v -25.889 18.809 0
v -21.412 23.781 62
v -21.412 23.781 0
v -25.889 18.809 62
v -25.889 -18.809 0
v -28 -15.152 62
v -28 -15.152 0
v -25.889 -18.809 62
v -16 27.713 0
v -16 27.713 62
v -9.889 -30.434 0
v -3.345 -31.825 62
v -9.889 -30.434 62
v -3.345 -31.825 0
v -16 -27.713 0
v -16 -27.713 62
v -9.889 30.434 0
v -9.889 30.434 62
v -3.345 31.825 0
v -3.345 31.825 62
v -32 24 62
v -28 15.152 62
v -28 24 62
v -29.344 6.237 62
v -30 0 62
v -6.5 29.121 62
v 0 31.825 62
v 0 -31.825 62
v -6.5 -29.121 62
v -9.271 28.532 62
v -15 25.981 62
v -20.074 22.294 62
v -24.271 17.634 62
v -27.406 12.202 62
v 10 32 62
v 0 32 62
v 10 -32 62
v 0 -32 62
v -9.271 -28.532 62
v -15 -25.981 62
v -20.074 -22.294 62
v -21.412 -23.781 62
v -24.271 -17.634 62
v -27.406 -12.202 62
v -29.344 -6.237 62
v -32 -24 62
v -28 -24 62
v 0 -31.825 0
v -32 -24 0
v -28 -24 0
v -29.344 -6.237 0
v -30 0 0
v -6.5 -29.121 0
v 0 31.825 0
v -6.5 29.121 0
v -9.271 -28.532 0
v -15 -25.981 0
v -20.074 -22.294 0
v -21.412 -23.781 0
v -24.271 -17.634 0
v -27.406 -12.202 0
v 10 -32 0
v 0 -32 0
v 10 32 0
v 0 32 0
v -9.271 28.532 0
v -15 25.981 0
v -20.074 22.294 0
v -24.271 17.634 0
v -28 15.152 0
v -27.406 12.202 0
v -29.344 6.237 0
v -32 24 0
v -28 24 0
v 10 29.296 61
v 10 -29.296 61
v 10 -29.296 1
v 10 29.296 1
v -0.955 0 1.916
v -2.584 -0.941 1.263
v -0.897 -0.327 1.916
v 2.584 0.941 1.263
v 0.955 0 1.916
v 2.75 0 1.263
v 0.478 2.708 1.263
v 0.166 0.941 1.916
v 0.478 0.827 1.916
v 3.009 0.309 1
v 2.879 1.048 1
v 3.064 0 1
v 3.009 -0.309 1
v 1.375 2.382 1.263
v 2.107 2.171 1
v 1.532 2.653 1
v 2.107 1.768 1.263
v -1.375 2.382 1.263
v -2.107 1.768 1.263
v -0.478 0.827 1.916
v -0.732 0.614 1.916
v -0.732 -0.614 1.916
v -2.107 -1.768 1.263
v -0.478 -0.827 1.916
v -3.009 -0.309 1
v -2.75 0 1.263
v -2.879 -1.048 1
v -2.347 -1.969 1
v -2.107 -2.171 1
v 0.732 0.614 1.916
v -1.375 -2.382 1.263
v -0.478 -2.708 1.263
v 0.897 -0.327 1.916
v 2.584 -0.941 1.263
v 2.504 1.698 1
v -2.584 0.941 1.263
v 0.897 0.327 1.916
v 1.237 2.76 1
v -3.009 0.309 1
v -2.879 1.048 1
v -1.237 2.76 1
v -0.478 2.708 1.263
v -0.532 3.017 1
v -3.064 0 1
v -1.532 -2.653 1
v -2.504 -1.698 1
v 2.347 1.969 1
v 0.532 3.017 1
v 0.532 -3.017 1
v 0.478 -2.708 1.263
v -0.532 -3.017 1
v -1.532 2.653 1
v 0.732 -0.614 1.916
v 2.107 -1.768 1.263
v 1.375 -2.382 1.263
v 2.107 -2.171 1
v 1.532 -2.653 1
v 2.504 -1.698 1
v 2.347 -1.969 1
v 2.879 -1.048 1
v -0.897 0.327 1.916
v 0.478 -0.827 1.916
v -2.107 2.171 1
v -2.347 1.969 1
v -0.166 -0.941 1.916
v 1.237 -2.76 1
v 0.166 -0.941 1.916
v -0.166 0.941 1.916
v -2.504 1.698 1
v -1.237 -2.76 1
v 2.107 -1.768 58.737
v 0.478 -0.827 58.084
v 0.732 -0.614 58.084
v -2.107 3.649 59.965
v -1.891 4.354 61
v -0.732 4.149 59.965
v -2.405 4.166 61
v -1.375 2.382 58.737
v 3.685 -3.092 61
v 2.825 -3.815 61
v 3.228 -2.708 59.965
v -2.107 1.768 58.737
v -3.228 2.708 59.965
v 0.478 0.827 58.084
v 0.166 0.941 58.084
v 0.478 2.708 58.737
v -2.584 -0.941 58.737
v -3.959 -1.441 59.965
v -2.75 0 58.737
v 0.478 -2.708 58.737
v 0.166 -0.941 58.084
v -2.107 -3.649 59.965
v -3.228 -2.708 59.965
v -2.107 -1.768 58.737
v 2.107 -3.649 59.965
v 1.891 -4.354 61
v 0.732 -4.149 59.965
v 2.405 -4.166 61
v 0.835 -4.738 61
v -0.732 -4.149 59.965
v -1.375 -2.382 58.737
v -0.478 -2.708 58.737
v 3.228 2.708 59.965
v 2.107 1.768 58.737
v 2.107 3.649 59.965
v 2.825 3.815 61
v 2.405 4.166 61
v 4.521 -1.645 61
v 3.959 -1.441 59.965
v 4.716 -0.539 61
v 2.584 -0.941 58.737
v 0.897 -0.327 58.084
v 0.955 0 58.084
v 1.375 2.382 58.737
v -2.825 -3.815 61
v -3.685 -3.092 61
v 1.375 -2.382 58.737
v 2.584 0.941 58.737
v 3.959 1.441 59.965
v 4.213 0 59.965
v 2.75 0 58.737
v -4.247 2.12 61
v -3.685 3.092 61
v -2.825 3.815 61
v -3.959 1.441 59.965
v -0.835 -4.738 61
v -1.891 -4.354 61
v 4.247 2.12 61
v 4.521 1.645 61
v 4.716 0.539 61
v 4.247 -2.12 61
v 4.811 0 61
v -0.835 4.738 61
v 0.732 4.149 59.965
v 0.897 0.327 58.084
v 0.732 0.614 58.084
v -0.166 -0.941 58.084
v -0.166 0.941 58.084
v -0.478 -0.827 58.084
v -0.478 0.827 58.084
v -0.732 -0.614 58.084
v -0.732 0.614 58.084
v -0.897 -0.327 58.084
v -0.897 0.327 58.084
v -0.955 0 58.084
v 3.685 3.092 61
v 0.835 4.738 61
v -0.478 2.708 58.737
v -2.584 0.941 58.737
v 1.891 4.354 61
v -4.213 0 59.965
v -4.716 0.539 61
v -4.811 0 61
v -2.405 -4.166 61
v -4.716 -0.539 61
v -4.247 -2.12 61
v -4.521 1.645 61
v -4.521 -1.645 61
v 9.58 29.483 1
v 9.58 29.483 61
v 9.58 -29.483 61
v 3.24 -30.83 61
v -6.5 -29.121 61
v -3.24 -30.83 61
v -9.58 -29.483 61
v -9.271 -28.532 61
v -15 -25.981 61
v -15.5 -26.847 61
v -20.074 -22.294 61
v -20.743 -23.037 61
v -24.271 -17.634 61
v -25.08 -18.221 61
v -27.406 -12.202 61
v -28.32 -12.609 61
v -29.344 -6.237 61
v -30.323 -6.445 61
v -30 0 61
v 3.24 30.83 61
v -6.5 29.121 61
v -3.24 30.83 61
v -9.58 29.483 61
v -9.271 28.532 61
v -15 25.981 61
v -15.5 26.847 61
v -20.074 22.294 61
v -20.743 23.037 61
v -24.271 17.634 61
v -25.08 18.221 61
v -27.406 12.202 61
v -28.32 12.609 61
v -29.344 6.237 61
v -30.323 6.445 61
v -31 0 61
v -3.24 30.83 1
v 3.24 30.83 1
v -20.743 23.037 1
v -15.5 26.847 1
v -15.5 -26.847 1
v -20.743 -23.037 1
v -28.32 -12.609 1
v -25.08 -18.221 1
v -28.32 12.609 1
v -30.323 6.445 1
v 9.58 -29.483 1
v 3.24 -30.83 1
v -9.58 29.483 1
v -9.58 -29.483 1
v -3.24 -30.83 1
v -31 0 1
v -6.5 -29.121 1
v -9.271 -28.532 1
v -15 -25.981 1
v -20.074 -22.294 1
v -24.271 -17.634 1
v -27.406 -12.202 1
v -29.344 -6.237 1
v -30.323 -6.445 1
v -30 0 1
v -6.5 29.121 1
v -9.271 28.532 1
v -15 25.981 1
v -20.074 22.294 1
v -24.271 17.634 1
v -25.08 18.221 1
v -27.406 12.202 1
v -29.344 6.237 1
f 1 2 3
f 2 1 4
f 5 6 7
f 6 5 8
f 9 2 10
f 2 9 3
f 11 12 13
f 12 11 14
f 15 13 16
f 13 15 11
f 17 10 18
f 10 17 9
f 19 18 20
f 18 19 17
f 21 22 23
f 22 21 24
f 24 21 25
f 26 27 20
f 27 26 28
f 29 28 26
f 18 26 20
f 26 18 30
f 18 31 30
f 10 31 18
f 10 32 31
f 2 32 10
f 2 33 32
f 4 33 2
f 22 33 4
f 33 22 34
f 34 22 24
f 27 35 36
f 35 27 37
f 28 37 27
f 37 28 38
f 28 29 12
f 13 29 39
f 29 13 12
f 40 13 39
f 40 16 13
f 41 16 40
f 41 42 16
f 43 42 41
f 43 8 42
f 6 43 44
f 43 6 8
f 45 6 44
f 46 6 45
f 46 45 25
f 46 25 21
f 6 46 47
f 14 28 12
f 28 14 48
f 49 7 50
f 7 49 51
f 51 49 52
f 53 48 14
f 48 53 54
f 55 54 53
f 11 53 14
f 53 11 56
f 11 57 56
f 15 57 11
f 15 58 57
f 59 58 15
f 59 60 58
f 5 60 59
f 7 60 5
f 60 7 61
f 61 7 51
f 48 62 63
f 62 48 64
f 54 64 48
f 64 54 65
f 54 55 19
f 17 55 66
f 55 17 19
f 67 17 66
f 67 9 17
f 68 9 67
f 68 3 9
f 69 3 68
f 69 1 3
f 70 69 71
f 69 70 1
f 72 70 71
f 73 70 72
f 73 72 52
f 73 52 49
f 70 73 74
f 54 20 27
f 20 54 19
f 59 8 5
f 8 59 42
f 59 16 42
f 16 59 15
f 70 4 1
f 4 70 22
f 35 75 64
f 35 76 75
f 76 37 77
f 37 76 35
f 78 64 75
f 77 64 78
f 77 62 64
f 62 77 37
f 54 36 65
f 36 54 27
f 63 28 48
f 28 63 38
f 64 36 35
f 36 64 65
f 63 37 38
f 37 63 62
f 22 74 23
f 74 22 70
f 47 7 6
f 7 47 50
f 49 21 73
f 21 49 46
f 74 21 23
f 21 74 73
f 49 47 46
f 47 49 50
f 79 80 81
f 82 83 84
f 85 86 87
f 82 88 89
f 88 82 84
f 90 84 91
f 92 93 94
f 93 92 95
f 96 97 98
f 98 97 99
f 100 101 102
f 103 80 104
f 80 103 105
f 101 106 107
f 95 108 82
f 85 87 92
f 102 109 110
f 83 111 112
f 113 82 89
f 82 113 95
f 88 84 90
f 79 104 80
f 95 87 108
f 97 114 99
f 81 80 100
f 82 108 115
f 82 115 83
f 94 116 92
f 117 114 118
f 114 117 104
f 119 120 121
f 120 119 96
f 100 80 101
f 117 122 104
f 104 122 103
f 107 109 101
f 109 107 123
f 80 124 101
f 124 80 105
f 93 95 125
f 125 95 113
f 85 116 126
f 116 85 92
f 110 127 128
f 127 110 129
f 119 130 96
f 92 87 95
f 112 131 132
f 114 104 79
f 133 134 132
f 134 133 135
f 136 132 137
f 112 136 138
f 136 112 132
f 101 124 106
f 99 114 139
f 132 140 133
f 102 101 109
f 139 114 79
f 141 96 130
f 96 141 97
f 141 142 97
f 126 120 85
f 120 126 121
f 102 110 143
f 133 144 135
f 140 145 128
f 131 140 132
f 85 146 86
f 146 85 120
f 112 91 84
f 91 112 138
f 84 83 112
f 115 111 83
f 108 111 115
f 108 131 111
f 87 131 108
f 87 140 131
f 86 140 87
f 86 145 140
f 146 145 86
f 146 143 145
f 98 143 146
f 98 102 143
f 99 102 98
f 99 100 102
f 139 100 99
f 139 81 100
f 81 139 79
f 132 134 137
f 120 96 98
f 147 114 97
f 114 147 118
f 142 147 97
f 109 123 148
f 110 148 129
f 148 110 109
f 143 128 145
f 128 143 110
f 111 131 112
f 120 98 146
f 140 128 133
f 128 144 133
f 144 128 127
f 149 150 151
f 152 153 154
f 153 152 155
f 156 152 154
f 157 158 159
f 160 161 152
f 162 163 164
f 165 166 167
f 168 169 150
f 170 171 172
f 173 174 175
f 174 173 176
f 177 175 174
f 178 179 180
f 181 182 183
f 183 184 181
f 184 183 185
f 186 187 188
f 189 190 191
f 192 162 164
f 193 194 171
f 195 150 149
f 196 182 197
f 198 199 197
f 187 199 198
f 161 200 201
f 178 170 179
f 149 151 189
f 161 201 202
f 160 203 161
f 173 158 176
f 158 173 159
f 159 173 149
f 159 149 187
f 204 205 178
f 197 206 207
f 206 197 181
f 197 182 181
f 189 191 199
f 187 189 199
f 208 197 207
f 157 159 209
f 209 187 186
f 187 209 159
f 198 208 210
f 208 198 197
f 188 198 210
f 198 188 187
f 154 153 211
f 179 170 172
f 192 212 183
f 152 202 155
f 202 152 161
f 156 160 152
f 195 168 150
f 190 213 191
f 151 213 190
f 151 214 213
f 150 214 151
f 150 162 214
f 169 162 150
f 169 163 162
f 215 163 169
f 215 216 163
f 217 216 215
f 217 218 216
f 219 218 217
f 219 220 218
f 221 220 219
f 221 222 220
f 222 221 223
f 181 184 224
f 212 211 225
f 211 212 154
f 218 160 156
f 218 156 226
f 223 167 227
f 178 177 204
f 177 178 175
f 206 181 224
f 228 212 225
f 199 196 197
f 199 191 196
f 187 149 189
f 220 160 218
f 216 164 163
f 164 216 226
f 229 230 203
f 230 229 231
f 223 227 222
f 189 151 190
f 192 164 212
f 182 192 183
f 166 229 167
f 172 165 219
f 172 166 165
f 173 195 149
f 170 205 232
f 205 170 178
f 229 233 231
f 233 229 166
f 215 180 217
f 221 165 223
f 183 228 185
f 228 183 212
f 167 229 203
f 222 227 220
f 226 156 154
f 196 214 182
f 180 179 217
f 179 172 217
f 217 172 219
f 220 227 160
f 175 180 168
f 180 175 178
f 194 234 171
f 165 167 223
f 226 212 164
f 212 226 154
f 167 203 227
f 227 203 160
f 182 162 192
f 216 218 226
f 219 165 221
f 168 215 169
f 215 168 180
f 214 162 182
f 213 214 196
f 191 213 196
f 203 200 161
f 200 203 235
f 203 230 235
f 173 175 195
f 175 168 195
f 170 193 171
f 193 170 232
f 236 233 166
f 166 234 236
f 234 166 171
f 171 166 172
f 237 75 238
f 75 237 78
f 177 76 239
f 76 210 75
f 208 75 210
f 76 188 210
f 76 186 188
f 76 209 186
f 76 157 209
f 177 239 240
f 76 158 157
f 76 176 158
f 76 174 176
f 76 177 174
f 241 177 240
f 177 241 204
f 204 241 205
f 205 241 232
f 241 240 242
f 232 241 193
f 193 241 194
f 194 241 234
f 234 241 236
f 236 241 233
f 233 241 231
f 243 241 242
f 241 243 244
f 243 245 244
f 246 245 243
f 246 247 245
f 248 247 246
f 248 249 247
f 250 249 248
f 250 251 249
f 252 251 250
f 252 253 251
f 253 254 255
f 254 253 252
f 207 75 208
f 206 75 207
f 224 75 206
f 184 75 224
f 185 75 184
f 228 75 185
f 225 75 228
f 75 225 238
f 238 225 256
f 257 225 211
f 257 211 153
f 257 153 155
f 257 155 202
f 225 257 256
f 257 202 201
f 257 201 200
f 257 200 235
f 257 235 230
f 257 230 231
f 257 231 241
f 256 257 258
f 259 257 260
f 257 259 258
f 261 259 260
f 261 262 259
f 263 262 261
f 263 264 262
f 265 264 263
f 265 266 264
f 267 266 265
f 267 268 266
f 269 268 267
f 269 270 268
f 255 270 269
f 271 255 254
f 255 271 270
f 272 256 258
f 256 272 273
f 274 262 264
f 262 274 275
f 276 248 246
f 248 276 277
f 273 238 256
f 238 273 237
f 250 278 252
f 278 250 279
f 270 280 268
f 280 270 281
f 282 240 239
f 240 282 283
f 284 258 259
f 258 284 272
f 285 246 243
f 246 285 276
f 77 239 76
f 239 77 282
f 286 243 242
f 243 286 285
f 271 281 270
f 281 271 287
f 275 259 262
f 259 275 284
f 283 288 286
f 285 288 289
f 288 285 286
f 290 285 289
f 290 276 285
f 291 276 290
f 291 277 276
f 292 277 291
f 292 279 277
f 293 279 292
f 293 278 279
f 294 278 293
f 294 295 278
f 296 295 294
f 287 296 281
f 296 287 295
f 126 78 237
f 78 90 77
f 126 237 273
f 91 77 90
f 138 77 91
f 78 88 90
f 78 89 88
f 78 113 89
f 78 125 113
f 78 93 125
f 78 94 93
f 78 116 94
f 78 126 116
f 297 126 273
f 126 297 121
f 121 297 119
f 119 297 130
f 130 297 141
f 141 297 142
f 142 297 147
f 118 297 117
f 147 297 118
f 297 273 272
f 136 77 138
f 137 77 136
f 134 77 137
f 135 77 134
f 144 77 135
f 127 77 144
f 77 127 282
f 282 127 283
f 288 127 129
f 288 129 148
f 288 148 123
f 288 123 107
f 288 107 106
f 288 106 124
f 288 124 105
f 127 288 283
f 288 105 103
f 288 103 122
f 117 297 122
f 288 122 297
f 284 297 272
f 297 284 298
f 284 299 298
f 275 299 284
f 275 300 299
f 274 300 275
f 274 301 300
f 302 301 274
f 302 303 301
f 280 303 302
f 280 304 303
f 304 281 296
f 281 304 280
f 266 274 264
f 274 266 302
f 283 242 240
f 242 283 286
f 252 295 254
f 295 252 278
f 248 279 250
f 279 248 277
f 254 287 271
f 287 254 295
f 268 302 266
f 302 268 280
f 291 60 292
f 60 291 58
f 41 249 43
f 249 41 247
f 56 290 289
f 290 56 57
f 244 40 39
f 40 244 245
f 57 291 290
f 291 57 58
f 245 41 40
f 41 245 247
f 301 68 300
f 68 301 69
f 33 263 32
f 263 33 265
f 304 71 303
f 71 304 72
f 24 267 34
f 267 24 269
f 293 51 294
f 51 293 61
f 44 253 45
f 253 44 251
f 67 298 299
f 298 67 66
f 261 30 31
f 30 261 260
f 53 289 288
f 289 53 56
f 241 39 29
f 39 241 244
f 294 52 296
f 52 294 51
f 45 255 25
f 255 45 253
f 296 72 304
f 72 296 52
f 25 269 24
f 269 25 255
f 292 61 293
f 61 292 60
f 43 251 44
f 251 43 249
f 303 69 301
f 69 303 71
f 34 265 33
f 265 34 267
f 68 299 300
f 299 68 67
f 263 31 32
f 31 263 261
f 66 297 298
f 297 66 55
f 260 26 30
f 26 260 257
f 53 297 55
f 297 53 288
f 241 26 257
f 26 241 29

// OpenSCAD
difference() {
    difference() {
        union() {
            cylinder(62, d=64);
            translate([0,-32,0]) cube([10,64,62]);
            translate([-32,-24,0]) cube([4,48,62]);
        }
        translate([10,-32,0]) cube([22,64,62]);
    }
    translate([0,0,1]) {
        difference() {
            cylinder(60, d=62);
            union() {
                translate([0,0,-4.5]) sphere(d=11);
                translate([0,0,58+4.5]) sphere(d=11);
            }
        }
    }
    
    translate([0,0,-2]) difference() {
        cylinder(66,d=60);
        translate([-6.5,-30,-1]) cube([48,60,70]);
    }
}
